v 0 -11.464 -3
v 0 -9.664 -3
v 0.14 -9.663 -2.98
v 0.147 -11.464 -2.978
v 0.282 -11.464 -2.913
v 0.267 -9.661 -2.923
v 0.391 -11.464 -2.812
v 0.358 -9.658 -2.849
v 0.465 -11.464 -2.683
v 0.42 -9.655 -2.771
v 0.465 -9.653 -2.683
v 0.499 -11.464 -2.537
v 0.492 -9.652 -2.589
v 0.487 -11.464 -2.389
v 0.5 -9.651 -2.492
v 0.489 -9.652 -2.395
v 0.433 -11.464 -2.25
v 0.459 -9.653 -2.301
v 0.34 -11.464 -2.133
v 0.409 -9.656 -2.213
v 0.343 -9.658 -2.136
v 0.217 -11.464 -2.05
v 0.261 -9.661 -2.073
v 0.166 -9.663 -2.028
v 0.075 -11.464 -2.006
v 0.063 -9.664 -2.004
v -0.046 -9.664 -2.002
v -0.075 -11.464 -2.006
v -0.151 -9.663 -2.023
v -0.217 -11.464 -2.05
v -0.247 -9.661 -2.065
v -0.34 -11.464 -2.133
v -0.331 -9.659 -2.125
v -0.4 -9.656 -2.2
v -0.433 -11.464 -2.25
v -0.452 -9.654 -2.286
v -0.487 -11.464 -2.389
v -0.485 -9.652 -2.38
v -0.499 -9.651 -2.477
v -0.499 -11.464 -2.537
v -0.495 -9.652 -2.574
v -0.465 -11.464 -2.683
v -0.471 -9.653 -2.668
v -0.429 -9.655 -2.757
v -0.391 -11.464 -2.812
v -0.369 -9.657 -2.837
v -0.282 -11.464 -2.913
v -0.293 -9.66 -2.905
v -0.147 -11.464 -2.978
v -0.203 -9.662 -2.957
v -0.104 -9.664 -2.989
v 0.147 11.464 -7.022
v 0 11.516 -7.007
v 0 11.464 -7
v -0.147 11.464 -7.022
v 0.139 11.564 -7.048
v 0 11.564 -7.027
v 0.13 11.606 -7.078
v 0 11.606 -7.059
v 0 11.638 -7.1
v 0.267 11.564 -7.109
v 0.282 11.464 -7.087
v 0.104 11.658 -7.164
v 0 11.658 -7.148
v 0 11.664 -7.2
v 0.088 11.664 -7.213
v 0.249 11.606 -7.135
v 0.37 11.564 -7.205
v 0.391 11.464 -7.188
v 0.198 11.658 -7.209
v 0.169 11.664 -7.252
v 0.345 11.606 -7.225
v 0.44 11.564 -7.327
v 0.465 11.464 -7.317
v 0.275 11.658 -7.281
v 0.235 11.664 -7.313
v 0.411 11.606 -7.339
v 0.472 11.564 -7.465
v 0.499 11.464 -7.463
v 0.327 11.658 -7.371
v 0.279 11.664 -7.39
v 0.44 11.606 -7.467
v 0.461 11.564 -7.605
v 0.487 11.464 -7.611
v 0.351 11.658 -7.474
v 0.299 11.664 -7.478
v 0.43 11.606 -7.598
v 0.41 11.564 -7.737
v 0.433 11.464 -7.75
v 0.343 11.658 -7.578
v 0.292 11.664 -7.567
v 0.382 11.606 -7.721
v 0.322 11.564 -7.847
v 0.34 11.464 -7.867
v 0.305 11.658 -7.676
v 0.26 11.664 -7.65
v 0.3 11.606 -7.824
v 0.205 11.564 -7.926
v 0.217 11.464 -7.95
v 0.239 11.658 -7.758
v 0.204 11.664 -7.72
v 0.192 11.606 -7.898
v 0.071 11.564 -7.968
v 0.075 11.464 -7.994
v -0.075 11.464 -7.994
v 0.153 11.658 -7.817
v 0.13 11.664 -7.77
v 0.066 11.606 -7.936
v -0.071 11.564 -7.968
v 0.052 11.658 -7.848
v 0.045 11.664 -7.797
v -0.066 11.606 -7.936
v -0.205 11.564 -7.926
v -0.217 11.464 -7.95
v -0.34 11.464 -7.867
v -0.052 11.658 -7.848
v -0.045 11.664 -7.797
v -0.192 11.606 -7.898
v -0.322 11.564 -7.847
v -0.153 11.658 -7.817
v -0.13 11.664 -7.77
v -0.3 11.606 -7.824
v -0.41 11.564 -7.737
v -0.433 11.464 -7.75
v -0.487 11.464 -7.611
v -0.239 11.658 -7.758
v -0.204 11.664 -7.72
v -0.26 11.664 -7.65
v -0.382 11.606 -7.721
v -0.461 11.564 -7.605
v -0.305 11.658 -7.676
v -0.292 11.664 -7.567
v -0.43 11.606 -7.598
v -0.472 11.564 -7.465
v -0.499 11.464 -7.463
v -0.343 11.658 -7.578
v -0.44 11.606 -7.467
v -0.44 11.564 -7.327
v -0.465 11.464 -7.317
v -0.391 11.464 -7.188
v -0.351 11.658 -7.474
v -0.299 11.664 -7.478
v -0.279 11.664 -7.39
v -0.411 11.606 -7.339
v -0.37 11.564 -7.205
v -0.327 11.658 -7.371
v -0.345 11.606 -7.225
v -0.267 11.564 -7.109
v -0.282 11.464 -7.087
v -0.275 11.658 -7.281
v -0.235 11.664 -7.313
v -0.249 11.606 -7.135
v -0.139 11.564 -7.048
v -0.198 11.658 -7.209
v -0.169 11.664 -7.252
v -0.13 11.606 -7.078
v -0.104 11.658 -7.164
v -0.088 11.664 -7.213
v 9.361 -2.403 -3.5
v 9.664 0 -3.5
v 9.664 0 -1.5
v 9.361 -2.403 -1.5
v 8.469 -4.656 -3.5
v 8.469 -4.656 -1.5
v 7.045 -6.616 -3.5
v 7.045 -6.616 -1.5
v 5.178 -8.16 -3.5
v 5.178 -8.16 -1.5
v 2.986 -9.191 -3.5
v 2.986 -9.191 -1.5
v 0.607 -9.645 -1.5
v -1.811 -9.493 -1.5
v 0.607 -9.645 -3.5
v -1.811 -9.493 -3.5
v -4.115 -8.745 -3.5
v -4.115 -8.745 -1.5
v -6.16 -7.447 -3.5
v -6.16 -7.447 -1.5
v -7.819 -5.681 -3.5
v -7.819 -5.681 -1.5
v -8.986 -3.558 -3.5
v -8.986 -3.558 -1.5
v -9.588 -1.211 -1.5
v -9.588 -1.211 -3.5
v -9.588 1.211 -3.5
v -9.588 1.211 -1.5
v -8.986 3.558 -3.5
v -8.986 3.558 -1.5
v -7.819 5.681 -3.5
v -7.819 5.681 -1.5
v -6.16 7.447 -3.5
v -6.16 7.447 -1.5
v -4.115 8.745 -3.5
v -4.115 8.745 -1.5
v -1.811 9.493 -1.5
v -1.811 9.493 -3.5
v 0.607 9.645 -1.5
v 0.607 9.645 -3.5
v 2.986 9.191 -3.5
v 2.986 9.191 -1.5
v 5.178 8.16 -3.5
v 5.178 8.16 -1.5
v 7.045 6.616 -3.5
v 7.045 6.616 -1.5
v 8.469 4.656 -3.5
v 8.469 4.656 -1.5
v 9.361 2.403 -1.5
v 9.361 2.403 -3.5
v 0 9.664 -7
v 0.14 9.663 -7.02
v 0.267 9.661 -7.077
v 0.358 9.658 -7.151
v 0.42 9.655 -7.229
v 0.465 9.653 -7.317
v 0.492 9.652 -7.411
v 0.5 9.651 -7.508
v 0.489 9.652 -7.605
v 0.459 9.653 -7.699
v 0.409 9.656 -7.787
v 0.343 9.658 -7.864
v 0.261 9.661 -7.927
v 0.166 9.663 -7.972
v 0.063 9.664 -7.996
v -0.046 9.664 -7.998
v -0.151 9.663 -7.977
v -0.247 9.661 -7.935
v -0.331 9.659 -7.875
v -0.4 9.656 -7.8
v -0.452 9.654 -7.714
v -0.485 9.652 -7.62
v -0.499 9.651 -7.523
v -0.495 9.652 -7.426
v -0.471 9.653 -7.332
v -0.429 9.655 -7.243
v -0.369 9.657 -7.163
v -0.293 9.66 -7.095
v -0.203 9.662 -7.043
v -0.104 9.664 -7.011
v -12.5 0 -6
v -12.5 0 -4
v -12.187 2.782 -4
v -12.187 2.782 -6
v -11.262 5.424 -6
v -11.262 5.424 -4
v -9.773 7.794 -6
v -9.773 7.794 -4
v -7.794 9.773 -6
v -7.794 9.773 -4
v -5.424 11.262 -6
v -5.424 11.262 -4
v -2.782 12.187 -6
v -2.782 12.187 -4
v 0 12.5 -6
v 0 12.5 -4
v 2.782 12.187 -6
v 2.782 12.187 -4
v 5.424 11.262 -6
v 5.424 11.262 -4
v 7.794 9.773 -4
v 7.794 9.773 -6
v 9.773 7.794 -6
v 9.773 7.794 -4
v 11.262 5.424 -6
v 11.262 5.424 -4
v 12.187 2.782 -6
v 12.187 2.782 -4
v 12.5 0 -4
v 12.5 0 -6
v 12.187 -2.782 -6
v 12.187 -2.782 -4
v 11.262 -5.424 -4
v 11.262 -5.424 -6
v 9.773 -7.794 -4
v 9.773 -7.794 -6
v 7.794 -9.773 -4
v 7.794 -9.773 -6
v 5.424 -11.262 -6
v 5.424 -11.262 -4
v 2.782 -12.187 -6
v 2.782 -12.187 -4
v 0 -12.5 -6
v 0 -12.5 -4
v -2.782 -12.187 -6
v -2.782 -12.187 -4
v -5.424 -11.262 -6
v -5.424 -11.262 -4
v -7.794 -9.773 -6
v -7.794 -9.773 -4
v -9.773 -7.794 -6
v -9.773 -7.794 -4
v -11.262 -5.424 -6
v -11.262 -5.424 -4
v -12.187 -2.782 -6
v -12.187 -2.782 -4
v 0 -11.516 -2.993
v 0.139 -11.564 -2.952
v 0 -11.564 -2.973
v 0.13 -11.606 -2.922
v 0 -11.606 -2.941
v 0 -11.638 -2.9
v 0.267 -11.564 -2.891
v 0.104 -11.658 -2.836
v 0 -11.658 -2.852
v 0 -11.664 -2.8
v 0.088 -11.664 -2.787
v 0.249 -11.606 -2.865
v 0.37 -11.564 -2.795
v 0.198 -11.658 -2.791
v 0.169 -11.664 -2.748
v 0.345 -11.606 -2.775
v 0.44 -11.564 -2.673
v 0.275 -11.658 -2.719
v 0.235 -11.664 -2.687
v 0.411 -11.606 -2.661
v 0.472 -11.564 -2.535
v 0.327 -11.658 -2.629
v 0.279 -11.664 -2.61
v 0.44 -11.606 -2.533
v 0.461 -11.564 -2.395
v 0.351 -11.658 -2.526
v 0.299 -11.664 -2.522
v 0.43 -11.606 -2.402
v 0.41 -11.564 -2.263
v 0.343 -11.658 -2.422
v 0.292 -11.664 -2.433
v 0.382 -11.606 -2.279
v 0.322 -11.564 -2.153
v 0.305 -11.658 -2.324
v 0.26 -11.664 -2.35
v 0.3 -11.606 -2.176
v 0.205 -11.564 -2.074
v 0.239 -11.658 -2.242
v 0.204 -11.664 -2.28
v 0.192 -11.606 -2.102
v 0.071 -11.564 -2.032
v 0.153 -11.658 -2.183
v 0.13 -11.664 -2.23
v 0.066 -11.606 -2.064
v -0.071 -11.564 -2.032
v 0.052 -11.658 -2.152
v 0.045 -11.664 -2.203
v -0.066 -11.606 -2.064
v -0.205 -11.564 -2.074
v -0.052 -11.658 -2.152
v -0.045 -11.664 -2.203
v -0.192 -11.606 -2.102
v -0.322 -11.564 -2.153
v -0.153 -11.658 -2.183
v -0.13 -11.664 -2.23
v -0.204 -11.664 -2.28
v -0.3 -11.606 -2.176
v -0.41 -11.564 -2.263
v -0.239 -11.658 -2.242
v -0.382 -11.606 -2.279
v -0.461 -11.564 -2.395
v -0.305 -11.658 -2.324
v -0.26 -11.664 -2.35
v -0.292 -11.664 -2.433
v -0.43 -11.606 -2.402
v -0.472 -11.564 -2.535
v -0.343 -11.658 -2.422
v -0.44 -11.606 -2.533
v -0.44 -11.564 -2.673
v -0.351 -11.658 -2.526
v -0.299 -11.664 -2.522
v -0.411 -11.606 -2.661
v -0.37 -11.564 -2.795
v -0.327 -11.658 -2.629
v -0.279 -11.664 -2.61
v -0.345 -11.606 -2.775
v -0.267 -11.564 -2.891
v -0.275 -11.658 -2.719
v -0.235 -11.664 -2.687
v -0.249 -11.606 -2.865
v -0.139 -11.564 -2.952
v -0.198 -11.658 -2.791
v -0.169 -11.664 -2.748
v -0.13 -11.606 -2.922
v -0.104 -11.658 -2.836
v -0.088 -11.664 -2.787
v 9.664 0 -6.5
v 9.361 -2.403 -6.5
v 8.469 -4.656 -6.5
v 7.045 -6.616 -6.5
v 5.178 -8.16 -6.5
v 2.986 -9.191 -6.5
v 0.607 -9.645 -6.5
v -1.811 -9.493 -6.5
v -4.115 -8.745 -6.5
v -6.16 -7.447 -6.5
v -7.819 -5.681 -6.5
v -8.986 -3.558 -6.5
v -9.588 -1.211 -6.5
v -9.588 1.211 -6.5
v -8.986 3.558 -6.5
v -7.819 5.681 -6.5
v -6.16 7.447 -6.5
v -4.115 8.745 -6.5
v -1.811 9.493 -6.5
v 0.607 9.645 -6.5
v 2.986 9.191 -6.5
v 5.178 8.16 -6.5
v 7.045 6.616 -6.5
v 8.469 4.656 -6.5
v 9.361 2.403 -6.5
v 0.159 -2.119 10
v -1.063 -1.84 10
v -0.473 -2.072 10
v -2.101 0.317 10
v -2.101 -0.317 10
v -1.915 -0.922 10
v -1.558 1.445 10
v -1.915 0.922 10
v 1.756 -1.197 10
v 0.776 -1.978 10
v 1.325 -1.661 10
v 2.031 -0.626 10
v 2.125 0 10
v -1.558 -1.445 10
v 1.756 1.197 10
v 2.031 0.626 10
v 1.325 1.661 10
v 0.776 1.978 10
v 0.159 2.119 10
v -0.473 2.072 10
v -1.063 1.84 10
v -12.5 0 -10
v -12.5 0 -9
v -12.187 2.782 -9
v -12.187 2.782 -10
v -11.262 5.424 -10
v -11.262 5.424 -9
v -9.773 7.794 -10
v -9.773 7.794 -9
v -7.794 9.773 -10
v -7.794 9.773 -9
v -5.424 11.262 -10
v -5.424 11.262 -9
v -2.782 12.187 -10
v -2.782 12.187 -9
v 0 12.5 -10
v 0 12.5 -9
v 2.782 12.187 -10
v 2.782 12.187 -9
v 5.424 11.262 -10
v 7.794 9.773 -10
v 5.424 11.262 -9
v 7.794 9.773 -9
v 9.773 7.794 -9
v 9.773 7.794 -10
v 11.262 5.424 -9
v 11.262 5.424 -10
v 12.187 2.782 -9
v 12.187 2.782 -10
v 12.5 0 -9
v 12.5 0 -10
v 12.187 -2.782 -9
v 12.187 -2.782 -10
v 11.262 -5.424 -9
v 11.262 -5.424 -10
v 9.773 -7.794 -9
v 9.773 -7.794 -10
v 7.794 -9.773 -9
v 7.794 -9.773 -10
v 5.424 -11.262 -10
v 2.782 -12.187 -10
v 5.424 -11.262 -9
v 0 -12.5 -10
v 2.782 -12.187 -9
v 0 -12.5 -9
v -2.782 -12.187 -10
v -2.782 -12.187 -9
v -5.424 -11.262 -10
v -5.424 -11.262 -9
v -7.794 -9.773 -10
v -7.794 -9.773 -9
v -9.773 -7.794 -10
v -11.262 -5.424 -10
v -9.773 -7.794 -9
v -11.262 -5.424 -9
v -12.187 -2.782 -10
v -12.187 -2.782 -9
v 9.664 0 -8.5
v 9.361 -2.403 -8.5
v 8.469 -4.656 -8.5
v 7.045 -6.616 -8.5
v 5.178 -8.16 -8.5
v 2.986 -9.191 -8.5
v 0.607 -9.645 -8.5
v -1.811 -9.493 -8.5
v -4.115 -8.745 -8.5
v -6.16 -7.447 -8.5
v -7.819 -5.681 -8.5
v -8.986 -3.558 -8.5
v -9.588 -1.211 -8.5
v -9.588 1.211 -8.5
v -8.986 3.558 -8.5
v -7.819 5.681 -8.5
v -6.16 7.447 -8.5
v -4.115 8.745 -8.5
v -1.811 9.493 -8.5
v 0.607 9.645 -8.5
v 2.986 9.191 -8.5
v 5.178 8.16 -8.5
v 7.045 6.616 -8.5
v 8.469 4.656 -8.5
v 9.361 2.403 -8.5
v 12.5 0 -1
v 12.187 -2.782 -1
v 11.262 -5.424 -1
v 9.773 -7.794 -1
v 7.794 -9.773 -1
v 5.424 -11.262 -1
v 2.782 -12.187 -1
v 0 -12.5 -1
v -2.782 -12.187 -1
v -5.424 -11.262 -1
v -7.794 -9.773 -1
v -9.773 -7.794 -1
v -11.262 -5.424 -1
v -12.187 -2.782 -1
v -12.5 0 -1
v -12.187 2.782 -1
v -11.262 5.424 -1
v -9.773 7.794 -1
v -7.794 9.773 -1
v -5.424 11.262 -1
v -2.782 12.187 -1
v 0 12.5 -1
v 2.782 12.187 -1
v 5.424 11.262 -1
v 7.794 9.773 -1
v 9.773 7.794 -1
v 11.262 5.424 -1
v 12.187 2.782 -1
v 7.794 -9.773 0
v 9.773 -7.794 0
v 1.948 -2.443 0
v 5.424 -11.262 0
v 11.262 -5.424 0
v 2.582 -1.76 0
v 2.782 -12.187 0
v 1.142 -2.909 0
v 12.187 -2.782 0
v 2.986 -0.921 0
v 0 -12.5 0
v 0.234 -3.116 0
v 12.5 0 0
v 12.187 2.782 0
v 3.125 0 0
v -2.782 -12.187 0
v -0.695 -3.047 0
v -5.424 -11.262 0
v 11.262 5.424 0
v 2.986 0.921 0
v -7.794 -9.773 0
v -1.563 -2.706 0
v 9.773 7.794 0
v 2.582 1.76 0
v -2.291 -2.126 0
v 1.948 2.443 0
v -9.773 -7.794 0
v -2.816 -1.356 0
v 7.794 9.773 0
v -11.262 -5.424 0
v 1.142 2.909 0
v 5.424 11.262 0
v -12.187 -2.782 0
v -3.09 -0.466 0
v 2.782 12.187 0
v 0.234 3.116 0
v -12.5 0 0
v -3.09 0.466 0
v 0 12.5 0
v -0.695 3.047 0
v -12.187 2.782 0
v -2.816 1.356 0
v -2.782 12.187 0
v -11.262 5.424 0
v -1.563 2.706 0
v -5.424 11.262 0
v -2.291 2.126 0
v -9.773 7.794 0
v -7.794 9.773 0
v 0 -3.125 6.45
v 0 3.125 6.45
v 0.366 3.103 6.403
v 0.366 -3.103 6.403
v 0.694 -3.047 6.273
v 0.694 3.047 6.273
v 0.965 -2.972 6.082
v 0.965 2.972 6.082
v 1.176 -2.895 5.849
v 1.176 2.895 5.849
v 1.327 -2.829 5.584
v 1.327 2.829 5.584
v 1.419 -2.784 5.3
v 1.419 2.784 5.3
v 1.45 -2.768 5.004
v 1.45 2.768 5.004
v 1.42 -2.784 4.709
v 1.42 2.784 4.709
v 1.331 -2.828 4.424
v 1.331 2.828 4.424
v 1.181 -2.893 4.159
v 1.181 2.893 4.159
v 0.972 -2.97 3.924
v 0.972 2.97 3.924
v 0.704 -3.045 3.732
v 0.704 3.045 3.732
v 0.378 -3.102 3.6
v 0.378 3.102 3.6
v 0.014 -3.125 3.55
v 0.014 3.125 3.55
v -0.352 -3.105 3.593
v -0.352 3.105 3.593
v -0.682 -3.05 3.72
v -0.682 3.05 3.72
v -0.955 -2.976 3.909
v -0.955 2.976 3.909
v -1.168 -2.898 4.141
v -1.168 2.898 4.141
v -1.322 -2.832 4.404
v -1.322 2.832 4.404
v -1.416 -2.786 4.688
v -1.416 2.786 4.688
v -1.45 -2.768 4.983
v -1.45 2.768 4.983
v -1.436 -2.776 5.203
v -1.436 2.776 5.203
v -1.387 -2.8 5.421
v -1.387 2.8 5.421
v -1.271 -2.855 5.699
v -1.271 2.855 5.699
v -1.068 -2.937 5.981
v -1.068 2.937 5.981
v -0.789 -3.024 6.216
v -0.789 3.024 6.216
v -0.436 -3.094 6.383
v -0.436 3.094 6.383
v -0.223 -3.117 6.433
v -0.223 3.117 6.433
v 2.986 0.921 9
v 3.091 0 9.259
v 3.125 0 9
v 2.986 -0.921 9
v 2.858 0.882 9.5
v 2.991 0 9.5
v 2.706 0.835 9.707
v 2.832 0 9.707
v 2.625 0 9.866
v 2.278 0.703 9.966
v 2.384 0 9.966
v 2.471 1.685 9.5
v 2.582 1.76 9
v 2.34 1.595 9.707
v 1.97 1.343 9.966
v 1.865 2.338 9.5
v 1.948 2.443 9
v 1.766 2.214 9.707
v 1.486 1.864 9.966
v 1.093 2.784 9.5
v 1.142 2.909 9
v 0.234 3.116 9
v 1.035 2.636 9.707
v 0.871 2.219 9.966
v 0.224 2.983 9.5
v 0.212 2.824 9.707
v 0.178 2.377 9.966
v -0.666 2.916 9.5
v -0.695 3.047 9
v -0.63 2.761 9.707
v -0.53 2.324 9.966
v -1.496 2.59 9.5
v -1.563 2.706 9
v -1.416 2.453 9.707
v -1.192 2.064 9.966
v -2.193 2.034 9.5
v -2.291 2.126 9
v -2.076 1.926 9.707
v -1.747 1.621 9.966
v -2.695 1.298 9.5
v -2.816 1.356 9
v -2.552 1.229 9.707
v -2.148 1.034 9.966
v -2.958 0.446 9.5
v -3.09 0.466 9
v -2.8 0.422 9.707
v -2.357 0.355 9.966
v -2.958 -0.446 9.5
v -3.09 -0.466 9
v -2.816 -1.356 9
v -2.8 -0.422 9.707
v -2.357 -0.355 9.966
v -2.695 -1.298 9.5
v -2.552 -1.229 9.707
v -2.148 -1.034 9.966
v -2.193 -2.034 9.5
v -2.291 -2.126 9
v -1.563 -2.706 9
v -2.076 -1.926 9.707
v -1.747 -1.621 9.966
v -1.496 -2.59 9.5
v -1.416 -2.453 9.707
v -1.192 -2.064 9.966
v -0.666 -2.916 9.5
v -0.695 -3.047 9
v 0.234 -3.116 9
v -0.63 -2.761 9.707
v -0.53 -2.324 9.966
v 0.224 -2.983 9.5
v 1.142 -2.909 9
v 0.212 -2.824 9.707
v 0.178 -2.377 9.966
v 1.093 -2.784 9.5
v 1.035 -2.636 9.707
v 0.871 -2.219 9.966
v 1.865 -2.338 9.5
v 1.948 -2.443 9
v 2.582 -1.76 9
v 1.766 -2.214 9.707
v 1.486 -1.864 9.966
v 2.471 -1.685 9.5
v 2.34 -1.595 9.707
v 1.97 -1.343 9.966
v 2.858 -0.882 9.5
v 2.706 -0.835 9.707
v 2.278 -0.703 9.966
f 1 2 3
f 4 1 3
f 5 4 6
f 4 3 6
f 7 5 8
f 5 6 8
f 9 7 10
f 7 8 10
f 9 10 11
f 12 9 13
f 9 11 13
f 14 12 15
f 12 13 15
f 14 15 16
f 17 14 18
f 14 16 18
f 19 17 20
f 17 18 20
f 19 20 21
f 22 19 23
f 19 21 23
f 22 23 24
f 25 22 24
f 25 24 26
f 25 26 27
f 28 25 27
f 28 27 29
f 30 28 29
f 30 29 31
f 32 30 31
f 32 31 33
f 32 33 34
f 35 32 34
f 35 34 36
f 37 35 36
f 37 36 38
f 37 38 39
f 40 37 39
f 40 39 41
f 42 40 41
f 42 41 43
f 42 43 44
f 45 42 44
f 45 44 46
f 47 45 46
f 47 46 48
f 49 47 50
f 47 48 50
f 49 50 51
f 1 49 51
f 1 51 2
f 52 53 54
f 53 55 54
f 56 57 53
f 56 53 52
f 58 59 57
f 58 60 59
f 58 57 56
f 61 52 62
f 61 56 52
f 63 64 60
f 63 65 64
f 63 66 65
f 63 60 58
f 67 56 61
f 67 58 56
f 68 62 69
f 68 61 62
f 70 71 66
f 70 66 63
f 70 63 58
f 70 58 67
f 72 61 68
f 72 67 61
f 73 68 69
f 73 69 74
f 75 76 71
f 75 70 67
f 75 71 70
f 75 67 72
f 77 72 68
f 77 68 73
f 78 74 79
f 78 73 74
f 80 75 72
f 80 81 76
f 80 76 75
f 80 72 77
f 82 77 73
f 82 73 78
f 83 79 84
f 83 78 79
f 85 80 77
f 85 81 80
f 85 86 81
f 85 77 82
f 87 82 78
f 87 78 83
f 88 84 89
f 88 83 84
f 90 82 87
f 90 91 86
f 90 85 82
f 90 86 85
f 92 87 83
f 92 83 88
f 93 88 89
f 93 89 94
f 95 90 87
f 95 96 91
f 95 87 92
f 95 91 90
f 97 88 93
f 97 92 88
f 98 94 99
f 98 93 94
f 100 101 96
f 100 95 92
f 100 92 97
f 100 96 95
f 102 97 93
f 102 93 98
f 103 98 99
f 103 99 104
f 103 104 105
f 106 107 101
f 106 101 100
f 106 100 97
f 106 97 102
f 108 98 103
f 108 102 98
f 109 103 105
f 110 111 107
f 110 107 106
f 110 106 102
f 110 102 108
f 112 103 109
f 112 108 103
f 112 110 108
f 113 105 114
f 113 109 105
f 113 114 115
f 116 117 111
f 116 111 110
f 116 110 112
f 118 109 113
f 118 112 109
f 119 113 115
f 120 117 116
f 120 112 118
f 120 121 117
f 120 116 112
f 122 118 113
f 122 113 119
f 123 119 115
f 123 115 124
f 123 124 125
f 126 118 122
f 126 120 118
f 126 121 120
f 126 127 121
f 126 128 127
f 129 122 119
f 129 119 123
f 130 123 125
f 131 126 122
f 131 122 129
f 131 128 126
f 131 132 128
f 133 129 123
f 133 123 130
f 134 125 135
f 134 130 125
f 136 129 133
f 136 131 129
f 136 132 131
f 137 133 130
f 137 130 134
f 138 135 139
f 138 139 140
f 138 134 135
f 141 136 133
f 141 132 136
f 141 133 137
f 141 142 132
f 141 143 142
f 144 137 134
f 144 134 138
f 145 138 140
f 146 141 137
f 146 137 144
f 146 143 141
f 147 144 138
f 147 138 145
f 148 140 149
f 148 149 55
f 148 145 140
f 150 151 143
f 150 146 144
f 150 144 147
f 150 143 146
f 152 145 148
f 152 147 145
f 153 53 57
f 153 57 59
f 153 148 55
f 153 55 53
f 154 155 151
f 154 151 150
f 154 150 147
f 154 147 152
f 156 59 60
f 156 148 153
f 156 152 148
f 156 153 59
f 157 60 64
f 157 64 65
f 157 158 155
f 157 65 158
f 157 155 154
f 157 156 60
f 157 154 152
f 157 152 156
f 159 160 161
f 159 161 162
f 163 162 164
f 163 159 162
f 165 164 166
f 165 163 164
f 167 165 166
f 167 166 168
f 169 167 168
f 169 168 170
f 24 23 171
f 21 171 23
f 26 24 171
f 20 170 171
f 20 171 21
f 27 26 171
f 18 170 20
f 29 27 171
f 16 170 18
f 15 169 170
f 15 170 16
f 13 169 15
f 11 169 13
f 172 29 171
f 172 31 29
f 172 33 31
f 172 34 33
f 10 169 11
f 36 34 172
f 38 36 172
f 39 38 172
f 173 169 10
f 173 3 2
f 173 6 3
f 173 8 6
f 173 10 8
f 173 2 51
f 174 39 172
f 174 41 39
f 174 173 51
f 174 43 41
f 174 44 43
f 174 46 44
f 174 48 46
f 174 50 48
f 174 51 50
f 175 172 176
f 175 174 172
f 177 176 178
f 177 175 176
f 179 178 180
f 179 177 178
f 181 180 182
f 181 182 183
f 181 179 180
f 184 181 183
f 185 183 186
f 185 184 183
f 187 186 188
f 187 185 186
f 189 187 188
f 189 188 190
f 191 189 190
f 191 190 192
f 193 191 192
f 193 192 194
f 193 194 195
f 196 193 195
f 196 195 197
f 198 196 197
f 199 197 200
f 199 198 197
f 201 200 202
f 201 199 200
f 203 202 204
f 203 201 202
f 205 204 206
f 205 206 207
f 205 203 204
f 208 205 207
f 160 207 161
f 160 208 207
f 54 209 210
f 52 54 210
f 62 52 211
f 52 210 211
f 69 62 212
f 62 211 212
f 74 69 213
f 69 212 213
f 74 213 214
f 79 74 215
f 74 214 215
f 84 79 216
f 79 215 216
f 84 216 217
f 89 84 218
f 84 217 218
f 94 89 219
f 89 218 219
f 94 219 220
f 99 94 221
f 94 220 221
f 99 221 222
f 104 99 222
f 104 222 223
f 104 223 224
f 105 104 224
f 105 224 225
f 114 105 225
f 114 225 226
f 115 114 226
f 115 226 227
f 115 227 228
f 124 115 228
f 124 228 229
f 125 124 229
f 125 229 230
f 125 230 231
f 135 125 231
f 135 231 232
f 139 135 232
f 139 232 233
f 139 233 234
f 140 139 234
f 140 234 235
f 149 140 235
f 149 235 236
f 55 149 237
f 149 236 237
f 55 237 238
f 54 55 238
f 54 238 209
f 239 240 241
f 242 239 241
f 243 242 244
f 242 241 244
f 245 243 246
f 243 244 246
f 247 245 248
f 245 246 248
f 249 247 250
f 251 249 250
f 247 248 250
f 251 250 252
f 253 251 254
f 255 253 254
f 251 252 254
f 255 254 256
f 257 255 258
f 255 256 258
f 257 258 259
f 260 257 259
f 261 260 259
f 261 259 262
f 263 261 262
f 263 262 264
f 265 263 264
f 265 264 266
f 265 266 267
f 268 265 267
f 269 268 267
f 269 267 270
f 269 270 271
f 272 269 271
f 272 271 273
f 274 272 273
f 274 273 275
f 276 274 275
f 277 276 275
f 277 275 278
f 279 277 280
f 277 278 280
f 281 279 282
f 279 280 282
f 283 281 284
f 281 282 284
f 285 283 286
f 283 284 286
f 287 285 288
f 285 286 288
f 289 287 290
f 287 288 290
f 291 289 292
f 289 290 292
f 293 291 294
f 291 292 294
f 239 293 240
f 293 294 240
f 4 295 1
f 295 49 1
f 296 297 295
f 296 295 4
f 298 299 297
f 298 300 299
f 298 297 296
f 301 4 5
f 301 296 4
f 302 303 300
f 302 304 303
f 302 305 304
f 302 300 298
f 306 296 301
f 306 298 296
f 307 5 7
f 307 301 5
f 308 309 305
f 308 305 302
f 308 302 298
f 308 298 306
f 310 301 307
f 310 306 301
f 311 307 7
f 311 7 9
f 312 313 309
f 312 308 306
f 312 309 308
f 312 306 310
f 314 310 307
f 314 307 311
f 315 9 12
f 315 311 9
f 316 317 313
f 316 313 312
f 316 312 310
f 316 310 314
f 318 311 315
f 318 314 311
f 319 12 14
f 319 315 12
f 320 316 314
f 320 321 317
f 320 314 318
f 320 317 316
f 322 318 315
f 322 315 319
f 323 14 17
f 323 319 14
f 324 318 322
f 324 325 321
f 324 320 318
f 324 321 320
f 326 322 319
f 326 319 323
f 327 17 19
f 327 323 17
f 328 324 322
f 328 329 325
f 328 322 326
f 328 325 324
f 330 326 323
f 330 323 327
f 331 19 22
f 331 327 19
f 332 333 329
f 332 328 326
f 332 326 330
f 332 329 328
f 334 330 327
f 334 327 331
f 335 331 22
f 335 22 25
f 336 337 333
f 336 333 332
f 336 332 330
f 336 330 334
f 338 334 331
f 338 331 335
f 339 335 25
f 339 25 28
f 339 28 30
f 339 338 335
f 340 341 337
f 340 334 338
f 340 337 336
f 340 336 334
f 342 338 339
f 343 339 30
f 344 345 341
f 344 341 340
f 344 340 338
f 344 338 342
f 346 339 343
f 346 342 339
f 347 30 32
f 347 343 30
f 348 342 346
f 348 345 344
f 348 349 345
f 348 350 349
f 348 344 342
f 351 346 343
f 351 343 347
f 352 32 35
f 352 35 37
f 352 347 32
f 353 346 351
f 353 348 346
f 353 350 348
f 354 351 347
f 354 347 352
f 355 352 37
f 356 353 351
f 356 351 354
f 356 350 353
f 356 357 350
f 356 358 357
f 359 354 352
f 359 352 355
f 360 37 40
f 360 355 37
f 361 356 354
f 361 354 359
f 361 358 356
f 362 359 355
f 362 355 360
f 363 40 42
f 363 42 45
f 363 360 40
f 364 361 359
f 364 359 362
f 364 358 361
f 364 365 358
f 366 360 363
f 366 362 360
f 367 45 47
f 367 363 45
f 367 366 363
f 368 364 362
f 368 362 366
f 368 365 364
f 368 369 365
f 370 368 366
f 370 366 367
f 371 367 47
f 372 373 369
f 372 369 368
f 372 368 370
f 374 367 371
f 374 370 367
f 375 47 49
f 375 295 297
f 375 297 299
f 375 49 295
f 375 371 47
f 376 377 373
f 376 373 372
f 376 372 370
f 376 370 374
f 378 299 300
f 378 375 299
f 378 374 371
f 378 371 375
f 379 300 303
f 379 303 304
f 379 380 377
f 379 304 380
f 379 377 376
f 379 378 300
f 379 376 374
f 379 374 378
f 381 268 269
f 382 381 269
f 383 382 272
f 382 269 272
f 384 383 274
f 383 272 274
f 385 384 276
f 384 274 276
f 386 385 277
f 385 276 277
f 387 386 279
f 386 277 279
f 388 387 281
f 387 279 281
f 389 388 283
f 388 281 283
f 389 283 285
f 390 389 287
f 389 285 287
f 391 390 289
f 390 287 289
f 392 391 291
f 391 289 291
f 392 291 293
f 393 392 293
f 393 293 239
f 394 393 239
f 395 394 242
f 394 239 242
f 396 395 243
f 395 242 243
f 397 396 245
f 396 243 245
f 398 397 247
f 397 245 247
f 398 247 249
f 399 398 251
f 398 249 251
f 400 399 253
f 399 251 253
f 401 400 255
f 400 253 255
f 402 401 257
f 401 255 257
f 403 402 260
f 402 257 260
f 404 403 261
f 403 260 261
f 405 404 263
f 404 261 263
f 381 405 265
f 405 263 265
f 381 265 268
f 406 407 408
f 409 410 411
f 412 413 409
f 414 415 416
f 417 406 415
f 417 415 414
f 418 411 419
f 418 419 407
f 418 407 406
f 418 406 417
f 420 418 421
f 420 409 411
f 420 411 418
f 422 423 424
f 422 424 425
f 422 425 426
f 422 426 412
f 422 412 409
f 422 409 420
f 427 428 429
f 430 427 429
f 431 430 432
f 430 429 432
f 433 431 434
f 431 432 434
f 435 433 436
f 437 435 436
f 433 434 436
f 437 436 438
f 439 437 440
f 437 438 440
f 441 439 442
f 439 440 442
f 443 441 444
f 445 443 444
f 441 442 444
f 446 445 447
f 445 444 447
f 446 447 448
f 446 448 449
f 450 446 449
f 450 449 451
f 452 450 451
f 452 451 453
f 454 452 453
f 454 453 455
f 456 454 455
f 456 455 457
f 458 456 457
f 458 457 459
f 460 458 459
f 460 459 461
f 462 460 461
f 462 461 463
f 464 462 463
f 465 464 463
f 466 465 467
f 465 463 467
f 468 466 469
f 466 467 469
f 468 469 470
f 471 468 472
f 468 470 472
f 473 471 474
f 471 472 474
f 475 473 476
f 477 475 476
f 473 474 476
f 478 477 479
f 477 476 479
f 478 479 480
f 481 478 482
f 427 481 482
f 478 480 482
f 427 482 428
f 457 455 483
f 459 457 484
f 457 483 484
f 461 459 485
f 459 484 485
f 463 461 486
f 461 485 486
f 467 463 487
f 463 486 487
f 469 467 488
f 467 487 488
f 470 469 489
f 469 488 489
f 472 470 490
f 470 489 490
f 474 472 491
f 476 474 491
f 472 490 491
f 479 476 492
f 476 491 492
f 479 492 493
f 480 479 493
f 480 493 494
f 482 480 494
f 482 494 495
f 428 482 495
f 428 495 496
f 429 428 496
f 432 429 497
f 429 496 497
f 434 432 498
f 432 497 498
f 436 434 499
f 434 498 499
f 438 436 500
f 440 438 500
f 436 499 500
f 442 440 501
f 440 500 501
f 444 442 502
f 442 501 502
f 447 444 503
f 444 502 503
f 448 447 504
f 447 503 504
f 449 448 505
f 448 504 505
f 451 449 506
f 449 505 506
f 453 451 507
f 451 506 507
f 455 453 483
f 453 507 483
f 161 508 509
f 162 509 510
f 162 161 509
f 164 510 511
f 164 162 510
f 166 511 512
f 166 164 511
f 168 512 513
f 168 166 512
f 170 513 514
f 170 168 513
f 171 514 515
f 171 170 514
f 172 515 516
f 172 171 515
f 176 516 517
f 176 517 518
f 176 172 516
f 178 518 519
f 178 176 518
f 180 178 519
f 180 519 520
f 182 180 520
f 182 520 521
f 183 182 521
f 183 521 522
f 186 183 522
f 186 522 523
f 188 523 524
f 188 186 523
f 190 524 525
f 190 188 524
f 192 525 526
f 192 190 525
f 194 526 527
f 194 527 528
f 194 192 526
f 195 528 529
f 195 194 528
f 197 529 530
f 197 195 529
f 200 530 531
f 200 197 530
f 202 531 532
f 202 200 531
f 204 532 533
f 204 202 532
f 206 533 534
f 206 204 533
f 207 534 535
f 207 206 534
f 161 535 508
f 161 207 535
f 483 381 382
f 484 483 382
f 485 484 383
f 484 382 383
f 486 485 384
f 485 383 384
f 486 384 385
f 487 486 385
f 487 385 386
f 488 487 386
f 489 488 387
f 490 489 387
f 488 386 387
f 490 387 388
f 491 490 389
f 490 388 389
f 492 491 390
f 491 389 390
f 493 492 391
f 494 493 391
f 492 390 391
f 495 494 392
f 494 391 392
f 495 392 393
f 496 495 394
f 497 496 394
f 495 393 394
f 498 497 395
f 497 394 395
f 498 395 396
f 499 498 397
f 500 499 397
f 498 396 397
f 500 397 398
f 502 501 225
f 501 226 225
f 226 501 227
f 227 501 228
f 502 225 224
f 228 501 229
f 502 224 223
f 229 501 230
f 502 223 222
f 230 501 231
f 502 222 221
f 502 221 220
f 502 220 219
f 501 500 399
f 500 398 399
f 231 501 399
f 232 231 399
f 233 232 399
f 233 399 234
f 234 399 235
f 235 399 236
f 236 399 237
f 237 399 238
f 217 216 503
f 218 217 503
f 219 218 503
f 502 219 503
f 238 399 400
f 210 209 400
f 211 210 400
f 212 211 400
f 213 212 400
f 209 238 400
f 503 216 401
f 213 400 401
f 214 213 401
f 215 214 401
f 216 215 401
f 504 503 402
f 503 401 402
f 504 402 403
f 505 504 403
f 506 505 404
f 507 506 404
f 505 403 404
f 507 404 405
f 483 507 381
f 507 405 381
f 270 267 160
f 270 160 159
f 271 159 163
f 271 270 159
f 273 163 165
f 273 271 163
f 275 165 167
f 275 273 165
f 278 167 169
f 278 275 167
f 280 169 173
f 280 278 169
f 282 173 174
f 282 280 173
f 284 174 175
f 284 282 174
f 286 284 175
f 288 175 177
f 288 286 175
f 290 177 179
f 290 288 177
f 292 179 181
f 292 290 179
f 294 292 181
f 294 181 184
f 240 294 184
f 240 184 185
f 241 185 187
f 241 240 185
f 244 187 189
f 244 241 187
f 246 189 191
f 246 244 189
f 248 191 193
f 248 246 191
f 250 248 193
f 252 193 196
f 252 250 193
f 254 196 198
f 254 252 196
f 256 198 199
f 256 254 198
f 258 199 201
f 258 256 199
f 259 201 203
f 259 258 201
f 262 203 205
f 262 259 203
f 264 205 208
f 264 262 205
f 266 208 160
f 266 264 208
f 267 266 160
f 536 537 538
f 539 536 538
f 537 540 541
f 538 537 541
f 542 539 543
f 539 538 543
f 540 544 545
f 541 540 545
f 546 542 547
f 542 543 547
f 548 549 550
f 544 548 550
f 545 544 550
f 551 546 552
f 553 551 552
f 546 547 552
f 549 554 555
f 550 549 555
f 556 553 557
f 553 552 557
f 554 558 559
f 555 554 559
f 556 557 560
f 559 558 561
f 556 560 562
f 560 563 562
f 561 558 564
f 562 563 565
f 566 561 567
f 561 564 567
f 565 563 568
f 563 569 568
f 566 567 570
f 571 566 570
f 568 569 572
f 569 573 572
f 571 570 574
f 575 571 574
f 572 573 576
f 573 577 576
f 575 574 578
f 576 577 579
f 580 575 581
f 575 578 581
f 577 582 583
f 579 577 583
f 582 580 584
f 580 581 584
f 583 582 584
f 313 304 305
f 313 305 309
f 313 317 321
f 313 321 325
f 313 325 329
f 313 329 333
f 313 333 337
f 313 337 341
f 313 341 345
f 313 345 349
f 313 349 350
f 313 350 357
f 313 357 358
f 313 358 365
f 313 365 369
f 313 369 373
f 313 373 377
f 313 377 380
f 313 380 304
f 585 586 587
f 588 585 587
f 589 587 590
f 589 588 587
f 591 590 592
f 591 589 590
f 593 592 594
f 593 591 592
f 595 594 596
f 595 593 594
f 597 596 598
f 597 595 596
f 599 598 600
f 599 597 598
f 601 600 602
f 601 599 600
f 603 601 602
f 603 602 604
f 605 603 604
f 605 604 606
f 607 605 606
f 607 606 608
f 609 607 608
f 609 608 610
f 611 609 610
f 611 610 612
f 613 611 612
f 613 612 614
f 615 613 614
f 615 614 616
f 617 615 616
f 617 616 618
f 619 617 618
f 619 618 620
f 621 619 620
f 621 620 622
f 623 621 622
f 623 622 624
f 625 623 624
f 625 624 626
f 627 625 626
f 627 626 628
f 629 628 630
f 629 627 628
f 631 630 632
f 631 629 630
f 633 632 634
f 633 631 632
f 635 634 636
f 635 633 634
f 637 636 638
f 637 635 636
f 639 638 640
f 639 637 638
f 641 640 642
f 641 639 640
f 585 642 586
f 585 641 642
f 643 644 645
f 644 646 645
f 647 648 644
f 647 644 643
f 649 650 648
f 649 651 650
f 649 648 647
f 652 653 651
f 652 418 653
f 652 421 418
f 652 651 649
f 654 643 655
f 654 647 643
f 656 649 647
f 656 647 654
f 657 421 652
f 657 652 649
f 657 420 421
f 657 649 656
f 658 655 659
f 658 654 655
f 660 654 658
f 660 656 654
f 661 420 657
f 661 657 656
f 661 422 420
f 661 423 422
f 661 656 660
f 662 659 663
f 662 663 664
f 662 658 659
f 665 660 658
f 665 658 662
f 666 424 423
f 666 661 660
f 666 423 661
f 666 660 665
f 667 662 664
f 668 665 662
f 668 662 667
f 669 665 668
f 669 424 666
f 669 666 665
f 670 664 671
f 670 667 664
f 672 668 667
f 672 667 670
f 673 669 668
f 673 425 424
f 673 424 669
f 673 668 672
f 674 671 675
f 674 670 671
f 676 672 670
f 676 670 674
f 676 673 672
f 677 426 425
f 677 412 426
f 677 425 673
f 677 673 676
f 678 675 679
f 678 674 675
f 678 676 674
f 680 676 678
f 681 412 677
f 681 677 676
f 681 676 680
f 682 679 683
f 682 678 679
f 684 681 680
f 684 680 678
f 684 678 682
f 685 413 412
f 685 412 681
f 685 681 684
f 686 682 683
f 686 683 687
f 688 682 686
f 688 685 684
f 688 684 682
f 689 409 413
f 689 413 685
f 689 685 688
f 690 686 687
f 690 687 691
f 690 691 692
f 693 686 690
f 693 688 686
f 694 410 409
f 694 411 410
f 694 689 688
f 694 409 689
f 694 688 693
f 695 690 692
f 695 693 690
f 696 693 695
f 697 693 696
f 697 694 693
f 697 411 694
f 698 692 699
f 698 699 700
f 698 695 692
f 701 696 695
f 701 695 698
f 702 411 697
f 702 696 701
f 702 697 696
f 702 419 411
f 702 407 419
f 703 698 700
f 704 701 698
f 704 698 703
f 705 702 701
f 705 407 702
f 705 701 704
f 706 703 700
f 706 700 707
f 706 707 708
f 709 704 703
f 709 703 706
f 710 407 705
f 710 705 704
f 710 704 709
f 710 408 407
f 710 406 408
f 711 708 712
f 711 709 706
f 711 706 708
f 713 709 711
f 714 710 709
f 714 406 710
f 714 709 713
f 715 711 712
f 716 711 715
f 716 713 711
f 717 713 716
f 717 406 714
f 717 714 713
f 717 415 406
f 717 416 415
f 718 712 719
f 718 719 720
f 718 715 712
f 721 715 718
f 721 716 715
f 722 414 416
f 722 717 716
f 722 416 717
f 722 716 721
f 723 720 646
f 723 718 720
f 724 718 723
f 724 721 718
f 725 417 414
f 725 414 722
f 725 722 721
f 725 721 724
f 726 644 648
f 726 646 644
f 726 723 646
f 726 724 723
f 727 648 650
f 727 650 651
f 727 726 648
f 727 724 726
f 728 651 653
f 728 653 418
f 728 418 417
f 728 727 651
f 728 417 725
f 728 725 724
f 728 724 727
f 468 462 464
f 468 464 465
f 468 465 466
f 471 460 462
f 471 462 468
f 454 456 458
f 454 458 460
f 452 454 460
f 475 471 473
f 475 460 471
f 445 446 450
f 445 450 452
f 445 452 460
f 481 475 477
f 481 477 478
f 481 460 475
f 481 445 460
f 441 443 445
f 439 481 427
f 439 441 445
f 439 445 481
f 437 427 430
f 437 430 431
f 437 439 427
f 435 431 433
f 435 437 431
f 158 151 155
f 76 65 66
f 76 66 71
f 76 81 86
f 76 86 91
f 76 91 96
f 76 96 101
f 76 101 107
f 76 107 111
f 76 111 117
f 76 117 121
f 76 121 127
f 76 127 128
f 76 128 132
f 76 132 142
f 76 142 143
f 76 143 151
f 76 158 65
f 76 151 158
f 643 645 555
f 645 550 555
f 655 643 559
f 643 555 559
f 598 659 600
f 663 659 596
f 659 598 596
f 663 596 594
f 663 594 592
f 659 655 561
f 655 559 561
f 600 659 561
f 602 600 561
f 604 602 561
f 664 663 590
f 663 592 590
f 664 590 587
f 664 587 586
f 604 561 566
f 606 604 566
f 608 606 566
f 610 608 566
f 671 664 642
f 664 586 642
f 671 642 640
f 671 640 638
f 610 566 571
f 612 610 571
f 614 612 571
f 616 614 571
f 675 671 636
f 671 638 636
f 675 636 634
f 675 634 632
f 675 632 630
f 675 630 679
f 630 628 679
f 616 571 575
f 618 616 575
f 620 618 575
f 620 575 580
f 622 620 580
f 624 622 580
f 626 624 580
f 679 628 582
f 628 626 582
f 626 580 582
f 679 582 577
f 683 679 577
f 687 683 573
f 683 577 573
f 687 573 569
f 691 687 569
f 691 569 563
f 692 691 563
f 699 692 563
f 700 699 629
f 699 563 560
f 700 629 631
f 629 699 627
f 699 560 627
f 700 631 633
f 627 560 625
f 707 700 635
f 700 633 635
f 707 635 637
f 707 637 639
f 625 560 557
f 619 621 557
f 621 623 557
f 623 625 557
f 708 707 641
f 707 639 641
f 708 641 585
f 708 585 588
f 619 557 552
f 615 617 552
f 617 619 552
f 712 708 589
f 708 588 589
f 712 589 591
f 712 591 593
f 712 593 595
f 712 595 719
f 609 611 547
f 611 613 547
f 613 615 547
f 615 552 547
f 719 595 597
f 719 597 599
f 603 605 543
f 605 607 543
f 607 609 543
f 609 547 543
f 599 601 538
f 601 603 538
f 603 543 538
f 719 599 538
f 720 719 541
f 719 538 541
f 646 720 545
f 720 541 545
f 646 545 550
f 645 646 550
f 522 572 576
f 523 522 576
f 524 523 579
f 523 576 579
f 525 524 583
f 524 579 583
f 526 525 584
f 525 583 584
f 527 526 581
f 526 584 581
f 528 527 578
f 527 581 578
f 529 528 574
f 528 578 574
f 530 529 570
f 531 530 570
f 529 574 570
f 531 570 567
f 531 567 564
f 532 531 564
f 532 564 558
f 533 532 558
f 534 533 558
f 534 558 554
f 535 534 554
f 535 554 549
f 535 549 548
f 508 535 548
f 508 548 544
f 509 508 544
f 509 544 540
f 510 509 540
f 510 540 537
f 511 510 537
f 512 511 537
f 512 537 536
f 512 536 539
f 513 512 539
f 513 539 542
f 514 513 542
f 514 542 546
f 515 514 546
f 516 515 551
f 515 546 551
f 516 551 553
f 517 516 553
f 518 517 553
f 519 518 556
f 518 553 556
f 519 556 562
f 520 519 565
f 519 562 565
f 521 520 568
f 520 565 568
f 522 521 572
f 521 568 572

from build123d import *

# Parameters (mm, degrees)
ESQUISSE1_R                  = 3.125
BOSS_EXTRU_1_DEPTH           = 10
CONG_1_R                     = 1
ESQUISSE2_R                  = 12.5
BOSS_EXTRU_3_DEPTH           = 10
ENL_V_MAT_EXTRU_1_DEPTH      = 21.310096012
ENL_V_MAT_EXTRU_1_DEPTH_BACK = 21.310096012
ESQUISSE6_R                  = 1.45
BOSS_EXTRU_4_DEPTH           = 2
BOSS_EXTRU_4_DEPTH_BACK      = 1
ESQUISSE7_R                  = 0.5
BOSS_EXTRU_5_DEPTH           = 2
BOSS_EXTRU_5_DEPTH_BACK      = 1
ESQUISSE8_R                  = 0.5
CONG_2_R                     = 0.2


with BuildPart() as part:
    # Esquisse1 → Boss.-Extru.1 (new body)
    with BuildSketch(Plane.XY):
        Circle(ESQUISSE1_R)
    extrude(amount=BOSS_EXTRU_1_DEPTH)

    # Congé1
    cong_1_edges = [part.edges().sort_by_distance(p)[0] for p in [
        (-3.125, 0, 10),
    ]]
    fillet(cong_1_edges, radius=CONG_1_R)

    # Esquisse2 → Boss.-Extru.3 (add)
    with BuildSketch(Plane(origin=(0, 0, 0), x_dir=(-1, 0, 0), z_dir=(0, 0, -1))):
        Circle(ESQUISSE2_R)
    extrude(amount=BOSS_EXTRU_3_DEPTH)

    # Esquisse5 → Enlèvement de matière-Révolution1 (revolve, cut)
    with BuildSketch(Plane(origin=(0, 0, 0), x_dir=(0, 0, -1), z_dir=(1, 0, 0)), mode=Mode.PRIVATE) as enl_vement_de_mati_re_r_volution1_sk:
        Polygon((1, 12.5), (1.5, 9.66435909), (3.5, 9.66435909), (4, 12.5), align=None)
        Polygon((6, 12.5), (9, 12.5), (8.5, 9.66435909), (6.5, 9.66435909), align=None)
    revolve(enl_vement_de_mati_re_r_volution1_sk.sketch.rotate(Axis((0, 0, 0), (0, 0, -1)), 90), axis=Axis((0, 0, 0), (0, 0, -1)), mode=Mode.SUBTRACT)

    # Esquisse6 → Enlèv. mat.-Extru.1 (cut, two sides: drawn at the far end of the back side and taken through both)
    with BuildSketch(Plane(origin=(0, 0, 0), x_dir=(1, 0, 0), z_dir=(0, 1, 0)).offset(-ENL_V_MAT_EXTRU_1_DEPTH_BACK)):
        with Locations(Location((0, -5, 0), (0, 0, 270))):
            Circle(ESQUISSE6_R)
    extrude(amount=ENL_V_MAT_EXTRU_1_DEPTH + ENL_V_MAT_EXTRU_1_DEPTH_BACK, mode=Mode.SUBTRACT)

    # Esquisse7 → Boss.-Extru.4 (add, two sides: drawn at the far end of the back side and taken through both)
    with BuildSketch(Plane(origin=(0, 9.66435909, 0), x_dir=(1, 0, 0), z_dir=(0, 1, 0)).offset(-BOSS_EXTRU_4_DEPTH_BACK)):
        with Locations(Location((0, 7.5, 0), (0, 0, 270))):
            Circle(ESQUISSE7_R)
    extrude(amount=BOSS_EXTRU_4_DEPTH + BOSS_EXTRU_4_DEPTH_BACK)

    # Esquisse8 → Boss.-Extru.5 (add, two sides: drawn at the far end of the back side and taken through both)
    with BuildSketch(Plane(origin=(0, -9.66435909, 0), x_dir=(-1, 0, 0), z_dir=(0, -1, 0)).offset(-BOSS_EXTRU_5_DEPTH_BACK)):
        with Locations(Location((0, 2.5, 0), (0, 0, 90))):
            Circle(ESQUISSE8_R)
    extrude(amount=BOSS_EXTRU_5_DEPTH + BOSS_EXTRU_5_DEPTH_BACK)

    # Congé2
    cong_2_edges = [part.edges().sort_by_distance(p)[0] for p in [
        (0, 11.66435909, -8),
        (0, -11.66435909, -2),
    ]]
    fillet(cong_2_edges, radius=CONG_2_R)


solid = part.part
